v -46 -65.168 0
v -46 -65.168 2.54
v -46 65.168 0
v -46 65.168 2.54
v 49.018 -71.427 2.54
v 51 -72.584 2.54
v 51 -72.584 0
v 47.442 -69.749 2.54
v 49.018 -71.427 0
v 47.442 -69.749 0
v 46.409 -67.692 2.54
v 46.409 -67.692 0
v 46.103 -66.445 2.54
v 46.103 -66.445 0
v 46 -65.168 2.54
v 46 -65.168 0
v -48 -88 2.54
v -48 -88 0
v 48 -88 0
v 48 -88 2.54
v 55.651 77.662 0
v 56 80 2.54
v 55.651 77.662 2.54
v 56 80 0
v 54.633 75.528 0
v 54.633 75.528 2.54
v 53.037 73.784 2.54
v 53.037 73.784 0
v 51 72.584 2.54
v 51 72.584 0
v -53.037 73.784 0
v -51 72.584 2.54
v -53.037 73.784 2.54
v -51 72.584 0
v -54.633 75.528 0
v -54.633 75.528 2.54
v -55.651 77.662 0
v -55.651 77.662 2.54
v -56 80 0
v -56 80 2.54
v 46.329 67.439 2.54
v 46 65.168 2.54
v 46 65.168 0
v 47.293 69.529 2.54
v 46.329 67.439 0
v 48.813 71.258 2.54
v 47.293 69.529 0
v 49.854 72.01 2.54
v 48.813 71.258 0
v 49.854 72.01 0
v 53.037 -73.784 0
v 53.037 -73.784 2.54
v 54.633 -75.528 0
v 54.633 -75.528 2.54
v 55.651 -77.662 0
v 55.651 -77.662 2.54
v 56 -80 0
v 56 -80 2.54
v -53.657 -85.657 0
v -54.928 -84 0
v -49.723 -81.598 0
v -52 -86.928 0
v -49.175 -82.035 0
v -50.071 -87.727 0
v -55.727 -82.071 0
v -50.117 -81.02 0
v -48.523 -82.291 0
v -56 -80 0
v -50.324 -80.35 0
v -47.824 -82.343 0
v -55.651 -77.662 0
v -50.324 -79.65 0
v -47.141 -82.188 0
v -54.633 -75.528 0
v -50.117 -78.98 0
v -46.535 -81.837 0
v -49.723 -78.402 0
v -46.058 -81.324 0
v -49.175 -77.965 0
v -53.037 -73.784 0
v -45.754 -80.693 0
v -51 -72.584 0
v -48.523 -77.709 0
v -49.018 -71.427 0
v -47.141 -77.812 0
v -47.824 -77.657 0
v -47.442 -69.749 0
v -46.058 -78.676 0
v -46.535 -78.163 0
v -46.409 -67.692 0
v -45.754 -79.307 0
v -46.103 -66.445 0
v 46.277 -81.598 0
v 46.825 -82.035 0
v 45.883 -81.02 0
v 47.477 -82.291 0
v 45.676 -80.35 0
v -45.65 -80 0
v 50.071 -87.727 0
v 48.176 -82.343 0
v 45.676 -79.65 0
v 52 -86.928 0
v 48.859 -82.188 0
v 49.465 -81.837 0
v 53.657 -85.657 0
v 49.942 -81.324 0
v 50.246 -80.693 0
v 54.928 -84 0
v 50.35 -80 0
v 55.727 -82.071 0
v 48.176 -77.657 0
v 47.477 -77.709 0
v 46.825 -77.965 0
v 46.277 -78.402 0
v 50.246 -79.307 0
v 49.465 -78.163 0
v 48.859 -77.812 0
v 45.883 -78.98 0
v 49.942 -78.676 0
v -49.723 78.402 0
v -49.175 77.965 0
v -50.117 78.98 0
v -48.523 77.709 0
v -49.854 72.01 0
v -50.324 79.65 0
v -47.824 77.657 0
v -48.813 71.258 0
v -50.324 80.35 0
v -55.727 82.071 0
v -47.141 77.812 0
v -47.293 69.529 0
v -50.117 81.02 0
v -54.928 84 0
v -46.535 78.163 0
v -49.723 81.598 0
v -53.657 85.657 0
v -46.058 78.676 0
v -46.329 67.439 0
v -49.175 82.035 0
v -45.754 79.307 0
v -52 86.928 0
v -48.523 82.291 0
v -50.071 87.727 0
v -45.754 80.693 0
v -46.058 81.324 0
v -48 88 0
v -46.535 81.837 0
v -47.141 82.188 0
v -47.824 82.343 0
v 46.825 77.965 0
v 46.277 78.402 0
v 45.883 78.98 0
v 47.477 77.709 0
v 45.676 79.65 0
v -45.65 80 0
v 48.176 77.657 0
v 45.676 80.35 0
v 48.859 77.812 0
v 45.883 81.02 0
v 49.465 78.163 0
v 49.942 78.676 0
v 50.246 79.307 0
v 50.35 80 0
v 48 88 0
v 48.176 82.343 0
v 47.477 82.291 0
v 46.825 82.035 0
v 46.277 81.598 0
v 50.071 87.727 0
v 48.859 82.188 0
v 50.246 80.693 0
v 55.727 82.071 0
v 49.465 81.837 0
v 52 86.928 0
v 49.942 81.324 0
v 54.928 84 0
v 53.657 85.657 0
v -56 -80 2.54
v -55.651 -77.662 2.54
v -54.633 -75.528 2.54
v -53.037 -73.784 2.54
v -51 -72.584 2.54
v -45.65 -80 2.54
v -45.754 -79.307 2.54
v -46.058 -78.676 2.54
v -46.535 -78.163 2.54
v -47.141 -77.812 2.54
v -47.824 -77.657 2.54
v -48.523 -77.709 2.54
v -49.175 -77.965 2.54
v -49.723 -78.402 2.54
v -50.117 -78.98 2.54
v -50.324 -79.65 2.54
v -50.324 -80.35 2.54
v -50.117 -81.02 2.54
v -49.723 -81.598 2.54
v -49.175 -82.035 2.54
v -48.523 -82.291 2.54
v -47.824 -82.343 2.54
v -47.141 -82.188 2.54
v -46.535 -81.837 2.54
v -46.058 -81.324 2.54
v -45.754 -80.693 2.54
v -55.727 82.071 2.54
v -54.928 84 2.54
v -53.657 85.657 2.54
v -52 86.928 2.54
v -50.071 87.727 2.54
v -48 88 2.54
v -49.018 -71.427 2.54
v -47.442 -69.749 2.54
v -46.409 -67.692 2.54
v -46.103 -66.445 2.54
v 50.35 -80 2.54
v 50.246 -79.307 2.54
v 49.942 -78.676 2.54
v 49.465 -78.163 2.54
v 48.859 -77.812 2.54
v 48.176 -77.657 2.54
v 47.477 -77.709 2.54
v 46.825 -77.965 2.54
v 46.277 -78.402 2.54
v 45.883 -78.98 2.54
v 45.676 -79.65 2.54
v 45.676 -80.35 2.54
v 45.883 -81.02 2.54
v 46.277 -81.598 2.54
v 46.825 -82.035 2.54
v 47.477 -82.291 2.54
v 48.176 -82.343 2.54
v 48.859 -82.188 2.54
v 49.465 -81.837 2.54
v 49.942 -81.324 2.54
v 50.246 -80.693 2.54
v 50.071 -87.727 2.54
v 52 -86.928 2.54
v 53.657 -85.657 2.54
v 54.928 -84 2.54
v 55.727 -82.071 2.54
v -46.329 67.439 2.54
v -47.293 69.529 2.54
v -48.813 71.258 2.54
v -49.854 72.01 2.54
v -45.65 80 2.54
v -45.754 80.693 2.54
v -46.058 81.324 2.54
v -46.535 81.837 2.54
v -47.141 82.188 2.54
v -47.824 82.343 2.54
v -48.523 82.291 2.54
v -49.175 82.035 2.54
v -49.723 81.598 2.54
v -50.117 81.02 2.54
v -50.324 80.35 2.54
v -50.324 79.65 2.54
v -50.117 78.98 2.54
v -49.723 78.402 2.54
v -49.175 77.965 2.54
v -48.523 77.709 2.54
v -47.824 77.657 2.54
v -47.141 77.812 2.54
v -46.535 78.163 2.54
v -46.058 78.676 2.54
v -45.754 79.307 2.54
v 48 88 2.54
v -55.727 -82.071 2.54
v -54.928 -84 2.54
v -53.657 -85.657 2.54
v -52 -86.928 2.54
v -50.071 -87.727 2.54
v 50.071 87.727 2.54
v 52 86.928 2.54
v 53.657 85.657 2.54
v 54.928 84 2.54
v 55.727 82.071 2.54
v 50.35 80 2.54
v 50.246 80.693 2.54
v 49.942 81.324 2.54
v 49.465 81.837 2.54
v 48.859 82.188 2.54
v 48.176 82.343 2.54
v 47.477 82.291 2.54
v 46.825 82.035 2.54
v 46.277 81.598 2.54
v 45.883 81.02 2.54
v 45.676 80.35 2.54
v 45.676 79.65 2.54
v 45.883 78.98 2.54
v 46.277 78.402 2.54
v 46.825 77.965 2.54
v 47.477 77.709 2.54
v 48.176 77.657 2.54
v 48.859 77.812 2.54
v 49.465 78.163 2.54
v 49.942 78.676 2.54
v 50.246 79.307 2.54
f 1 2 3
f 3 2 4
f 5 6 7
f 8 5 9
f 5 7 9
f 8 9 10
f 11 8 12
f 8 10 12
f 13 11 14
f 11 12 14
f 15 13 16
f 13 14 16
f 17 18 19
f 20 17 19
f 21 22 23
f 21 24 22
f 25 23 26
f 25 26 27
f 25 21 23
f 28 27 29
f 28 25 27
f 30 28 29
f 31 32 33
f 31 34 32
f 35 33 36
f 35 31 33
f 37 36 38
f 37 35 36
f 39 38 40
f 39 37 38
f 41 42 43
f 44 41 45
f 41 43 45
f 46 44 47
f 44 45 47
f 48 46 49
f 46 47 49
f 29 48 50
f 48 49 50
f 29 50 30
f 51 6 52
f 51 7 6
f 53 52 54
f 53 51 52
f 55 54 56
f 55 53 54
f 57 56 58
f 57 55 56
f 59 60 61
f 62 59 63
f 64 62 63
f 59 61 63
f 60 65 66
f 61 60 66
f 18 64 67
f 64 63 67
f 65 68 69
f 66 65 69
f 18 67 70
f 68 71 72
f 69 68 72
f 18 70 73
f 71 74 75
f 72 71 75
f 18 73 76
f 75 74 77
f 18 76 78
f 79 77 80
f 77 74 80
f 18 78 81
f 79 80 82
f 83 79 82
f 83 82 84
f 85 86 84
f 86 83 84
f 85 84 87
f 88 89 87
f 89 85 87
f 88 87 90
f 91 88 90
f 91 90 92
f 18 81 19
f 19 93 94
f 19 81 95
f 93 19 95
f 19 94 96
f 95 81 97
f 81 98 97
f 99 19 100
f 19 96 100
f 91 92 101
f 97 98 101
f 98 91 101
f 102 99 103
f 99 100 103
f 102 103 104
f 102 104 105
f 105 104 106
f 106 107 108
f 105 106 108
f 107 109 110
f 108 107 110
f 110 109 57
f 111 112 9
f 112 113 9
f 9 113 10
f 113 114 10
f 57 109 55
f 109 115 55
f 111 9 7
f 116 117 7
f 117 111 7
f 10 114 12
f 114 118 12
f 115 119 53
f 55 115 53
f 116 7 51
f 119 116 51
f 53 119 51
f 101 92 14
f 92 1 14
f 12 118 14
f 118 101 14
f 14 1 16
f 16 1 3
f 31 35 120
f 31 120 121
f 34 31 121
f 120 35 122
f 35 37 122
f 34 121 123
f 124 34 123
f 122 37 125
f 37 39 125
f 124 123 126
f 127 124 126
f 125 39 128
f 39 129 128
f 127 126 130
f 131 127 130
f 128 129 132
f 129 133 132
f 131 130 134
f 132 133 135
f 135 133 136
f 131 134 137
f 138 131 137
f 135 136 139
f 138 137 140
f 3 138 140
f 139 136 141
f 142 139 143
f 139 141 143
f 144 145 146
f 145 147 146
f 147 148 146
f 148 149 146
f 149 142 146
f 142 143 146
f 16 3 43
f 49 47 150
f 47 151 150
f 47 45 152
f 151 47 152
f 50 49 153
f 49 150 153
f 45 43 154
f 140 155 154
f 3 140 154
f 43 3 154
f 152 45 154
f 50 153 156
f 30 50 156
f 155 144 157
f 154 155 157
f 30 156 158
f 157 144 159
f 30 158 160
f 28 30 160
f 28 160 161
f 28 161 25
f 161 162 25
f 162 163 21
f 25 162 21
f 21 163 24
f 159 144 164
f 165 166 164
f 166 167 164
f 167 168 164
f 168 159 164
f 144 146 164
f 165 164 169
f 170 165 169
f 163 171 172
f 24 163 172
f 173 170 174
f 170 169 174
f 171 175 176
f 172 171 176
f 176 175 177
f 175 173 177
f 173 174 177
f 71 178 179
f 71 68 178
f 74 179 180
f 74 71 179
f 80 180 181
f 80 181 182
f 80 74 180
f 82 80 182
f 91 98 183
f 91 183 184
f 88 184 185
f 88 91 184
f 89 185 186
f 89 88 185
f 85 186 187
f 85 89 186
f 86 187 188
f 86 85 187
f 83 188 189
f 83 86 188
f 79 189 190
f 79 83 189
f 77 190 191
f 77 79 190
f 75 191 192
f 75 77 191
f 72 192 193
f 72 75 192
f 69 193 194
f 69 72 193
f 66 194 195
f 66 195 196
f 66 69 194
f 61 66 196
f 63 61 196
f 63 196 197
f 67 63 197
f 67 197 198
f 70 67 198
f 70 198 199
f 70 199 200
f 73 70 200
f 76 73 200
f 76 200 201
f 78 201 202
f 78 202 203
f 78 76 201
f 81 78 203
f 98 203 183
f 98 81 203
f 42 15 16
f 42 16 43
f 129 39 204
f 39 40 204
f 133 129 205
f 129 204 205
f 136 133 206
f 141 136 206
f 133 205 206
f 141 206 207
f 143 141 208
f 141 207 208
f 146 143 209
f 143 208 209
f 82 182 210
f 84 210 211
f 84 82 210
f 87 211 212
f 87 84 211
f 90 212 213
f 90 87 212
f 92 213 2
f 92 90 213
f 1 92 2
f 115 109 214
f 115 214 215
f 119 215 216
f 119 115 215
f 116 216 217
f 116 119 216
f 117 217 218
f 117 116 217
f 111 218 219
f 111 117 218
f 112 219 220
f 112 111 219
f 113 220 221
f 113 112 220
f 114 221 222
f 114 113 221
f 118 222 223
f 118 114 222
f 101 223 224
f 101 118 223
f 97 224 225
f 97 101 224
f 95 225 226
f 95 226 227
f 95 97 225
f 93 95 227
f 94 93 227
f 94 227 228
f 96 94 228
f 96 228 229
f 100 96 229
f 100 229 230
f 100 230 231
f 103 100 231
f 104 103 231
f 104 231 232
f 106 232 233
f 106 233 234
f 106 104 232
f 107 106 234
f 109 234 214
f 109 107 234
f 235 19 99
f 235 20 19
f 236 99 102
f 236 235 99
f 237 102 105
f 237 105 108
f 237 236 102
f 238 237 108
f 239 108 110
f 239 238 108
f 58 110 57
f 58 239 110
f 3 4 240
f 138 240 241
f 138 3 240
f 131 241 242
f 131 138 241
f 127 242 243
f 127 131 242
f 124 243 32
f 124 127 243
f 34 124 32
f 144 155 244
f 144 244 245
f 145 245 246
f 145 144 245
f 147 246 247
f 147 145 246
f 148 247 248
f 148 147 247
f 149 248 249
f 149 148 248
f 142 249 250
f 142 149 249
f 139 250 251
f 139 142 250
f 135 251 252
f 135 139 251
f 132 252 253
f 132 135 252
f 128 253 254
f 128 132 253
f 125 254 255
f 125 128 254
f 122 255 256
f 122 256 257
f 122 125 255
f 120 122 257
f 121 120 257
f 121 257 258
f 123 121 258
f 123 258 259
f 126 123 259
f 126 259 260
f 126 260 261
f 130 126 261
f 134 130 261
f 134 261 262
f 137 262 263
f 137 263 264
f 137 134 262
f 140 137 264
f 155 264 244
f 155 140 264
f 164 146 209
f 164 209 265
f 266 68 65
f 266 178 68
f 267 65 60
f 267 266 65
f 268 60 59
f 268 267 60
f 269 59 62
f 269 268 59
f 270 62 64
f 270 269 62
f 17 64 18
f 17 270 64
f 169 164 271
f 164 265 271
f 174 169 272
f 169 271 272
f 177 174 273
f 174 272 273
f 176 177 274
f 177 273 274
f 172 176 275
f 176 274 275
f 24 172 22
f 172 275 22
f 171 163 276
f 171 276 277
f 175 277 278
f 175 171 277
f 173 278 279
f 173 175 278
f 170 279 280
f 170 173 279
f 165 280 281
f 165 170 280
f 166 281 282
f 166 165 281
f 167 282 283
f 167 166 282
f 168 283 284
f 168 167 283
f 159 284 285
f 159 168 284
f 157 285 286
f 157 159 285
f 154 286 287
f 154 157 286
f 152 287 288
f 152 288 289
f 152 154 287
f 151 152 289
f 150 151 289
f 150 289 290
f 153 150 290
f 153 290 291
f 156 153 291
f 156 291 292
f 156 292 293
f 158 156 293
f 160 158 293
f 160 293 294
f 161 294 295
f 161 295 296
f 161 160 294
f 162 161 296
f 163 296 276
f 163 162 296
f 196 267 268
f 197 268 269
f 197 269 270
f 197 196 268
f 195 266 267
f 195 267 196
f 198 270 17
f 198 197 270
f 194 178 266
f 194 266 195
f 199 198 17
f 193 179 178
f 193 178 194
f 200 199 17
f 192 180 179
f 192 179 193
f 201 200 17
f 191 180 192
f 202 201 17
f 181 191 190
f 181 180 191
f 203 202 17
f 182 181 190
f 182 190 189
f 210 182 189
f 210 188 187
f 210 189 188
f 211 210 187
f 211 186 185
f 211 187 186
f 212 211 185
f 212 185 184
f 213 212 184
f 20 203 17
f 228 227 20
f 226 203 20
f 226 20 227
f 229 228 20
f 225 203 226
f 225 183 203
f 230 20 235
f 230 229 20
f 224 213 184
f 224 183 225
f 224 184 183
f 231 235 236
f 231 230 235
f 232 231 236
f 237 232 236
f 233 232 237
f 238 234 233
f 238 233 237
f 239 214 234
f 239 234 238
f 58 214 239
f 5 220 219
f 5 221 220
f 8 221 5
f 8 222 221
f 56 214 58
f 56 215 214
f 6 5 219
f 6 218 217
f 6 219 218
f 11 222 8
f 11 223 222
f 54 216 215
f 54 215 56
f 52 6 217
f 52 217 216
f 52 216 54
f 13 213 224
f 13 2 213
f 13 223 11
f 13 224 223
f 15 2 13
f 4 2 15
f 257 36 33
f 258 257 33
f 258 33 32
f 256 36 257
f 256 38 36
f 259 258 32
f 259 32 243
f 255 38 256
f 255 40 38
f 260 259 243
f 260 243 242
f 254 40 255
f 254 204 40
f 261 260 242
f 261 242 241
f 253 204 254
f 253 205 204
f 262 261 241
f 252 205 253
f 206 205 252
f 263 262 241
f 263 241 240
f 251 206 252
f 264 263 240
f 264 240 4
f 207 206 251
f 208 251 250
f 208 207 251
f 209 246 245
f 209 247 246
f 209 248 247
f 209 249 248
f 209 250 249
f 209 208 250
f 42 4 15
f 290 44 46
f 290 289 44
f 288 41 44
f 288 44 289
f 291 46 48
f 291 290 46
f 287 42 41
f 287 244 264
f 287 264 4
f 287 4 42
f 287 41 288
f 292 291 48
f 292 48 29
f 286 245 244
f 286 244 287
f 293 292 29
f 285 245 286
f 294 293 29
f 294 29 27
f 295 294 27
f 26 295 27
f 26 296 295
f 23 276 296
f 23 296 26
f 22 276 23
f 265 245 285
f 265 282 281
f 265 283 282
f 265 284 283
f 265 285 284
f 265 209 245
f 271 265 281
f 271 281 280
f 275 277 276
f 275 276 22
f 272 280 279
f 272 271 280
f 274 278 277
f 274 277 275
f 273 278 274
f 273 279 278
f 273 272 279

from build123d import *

# Parameters (mm, degrees)
SKETCH1_W           = 112
SKETCH1_H           = 176
SKETCH1_R           = 2.35
BOSS_EXTRUDE1_DEPTH = 2.54
FILLET1_R           = 8
SKETCH2_W           = 10
SKETCH2_H           = 144
CUT_EXTRUDE1_DEPTH  = 3.18
FILLET2_R           = 8
FILLET3_R           = 8


with BuildPart() as part:
    # Sketch1 → Boss-Extrude1 (new body)
    with BuildSketch(Plane.XY):
        Rectangle(SKETCH1_W, SKETCH1_H)
        with Locations((-48, 80)):
            Circle(SKETCH1_R, mode=Mode.SUBTRACT)
        with Locations((48, 80)):
            Circle(SKETCH1_R, mode=Mode.SUBTRACT)
        with Locations((48, -80)):
            Circle(SKETCH1_R, mode=Mode.SUBTRACT)
        with Locations((-48, -80)):
            Circle(SKETCH1_R, mode=Mode.SUBTRACT)
    extrude(amount=BOSS_EXTRUDE1_DEPTH)

    # Fillet1
    fillet1_edges = [part.edges().sort_by_distance(p)[0] for p in [
        (56, -88, 1.27),
        (-56, -88, 1.27),
        (-56, 88, 1.27),
        (56, 88, 1.27),
    ]]
    fillet(fillet1_edges, radius=FILLET1_R)

    # Sketch2 → Cut-Extrude1 (cut)
    with BuildSketch(Plane.XY.offset(2.54)):
        with Locations((-51, 0)):
            Rectangle(SKETCH2_W, SKETCH2_H)
        with Locations((51, 0)):
            Rectangle(SKETCH2_W, SKETCH2_H)
    extrude(amount=-CUT_EXTRUDE1_DEPTH, mode=Mode.SUBTRACT)

    # Fillet2
    fillet2_edges = [part.edges().sort_by_distance(p)[0] for p in [
        (56, 72, 1.27),
        (56, -72, 1.27),
        (-56, -72, 1.27),
        (-56, 72, 1.27),
    ]]
    fillet(fillet2_edges, radius=FILLET2_R - 0.0001)  # a hair under: the kernel refuses the full size

    # Fillet3
    fillet3_edges = [part.edges().sort_by_distance(p)[0] for p in [
        (46, -72, 1.27),
        (46, 72, 1.27),
        (-46, 72, 1.27),
        (-46, -72, 1.27),
    ]]
    fillet(fillet3_edges, radius=FILLET3_R)


solid = part.part
